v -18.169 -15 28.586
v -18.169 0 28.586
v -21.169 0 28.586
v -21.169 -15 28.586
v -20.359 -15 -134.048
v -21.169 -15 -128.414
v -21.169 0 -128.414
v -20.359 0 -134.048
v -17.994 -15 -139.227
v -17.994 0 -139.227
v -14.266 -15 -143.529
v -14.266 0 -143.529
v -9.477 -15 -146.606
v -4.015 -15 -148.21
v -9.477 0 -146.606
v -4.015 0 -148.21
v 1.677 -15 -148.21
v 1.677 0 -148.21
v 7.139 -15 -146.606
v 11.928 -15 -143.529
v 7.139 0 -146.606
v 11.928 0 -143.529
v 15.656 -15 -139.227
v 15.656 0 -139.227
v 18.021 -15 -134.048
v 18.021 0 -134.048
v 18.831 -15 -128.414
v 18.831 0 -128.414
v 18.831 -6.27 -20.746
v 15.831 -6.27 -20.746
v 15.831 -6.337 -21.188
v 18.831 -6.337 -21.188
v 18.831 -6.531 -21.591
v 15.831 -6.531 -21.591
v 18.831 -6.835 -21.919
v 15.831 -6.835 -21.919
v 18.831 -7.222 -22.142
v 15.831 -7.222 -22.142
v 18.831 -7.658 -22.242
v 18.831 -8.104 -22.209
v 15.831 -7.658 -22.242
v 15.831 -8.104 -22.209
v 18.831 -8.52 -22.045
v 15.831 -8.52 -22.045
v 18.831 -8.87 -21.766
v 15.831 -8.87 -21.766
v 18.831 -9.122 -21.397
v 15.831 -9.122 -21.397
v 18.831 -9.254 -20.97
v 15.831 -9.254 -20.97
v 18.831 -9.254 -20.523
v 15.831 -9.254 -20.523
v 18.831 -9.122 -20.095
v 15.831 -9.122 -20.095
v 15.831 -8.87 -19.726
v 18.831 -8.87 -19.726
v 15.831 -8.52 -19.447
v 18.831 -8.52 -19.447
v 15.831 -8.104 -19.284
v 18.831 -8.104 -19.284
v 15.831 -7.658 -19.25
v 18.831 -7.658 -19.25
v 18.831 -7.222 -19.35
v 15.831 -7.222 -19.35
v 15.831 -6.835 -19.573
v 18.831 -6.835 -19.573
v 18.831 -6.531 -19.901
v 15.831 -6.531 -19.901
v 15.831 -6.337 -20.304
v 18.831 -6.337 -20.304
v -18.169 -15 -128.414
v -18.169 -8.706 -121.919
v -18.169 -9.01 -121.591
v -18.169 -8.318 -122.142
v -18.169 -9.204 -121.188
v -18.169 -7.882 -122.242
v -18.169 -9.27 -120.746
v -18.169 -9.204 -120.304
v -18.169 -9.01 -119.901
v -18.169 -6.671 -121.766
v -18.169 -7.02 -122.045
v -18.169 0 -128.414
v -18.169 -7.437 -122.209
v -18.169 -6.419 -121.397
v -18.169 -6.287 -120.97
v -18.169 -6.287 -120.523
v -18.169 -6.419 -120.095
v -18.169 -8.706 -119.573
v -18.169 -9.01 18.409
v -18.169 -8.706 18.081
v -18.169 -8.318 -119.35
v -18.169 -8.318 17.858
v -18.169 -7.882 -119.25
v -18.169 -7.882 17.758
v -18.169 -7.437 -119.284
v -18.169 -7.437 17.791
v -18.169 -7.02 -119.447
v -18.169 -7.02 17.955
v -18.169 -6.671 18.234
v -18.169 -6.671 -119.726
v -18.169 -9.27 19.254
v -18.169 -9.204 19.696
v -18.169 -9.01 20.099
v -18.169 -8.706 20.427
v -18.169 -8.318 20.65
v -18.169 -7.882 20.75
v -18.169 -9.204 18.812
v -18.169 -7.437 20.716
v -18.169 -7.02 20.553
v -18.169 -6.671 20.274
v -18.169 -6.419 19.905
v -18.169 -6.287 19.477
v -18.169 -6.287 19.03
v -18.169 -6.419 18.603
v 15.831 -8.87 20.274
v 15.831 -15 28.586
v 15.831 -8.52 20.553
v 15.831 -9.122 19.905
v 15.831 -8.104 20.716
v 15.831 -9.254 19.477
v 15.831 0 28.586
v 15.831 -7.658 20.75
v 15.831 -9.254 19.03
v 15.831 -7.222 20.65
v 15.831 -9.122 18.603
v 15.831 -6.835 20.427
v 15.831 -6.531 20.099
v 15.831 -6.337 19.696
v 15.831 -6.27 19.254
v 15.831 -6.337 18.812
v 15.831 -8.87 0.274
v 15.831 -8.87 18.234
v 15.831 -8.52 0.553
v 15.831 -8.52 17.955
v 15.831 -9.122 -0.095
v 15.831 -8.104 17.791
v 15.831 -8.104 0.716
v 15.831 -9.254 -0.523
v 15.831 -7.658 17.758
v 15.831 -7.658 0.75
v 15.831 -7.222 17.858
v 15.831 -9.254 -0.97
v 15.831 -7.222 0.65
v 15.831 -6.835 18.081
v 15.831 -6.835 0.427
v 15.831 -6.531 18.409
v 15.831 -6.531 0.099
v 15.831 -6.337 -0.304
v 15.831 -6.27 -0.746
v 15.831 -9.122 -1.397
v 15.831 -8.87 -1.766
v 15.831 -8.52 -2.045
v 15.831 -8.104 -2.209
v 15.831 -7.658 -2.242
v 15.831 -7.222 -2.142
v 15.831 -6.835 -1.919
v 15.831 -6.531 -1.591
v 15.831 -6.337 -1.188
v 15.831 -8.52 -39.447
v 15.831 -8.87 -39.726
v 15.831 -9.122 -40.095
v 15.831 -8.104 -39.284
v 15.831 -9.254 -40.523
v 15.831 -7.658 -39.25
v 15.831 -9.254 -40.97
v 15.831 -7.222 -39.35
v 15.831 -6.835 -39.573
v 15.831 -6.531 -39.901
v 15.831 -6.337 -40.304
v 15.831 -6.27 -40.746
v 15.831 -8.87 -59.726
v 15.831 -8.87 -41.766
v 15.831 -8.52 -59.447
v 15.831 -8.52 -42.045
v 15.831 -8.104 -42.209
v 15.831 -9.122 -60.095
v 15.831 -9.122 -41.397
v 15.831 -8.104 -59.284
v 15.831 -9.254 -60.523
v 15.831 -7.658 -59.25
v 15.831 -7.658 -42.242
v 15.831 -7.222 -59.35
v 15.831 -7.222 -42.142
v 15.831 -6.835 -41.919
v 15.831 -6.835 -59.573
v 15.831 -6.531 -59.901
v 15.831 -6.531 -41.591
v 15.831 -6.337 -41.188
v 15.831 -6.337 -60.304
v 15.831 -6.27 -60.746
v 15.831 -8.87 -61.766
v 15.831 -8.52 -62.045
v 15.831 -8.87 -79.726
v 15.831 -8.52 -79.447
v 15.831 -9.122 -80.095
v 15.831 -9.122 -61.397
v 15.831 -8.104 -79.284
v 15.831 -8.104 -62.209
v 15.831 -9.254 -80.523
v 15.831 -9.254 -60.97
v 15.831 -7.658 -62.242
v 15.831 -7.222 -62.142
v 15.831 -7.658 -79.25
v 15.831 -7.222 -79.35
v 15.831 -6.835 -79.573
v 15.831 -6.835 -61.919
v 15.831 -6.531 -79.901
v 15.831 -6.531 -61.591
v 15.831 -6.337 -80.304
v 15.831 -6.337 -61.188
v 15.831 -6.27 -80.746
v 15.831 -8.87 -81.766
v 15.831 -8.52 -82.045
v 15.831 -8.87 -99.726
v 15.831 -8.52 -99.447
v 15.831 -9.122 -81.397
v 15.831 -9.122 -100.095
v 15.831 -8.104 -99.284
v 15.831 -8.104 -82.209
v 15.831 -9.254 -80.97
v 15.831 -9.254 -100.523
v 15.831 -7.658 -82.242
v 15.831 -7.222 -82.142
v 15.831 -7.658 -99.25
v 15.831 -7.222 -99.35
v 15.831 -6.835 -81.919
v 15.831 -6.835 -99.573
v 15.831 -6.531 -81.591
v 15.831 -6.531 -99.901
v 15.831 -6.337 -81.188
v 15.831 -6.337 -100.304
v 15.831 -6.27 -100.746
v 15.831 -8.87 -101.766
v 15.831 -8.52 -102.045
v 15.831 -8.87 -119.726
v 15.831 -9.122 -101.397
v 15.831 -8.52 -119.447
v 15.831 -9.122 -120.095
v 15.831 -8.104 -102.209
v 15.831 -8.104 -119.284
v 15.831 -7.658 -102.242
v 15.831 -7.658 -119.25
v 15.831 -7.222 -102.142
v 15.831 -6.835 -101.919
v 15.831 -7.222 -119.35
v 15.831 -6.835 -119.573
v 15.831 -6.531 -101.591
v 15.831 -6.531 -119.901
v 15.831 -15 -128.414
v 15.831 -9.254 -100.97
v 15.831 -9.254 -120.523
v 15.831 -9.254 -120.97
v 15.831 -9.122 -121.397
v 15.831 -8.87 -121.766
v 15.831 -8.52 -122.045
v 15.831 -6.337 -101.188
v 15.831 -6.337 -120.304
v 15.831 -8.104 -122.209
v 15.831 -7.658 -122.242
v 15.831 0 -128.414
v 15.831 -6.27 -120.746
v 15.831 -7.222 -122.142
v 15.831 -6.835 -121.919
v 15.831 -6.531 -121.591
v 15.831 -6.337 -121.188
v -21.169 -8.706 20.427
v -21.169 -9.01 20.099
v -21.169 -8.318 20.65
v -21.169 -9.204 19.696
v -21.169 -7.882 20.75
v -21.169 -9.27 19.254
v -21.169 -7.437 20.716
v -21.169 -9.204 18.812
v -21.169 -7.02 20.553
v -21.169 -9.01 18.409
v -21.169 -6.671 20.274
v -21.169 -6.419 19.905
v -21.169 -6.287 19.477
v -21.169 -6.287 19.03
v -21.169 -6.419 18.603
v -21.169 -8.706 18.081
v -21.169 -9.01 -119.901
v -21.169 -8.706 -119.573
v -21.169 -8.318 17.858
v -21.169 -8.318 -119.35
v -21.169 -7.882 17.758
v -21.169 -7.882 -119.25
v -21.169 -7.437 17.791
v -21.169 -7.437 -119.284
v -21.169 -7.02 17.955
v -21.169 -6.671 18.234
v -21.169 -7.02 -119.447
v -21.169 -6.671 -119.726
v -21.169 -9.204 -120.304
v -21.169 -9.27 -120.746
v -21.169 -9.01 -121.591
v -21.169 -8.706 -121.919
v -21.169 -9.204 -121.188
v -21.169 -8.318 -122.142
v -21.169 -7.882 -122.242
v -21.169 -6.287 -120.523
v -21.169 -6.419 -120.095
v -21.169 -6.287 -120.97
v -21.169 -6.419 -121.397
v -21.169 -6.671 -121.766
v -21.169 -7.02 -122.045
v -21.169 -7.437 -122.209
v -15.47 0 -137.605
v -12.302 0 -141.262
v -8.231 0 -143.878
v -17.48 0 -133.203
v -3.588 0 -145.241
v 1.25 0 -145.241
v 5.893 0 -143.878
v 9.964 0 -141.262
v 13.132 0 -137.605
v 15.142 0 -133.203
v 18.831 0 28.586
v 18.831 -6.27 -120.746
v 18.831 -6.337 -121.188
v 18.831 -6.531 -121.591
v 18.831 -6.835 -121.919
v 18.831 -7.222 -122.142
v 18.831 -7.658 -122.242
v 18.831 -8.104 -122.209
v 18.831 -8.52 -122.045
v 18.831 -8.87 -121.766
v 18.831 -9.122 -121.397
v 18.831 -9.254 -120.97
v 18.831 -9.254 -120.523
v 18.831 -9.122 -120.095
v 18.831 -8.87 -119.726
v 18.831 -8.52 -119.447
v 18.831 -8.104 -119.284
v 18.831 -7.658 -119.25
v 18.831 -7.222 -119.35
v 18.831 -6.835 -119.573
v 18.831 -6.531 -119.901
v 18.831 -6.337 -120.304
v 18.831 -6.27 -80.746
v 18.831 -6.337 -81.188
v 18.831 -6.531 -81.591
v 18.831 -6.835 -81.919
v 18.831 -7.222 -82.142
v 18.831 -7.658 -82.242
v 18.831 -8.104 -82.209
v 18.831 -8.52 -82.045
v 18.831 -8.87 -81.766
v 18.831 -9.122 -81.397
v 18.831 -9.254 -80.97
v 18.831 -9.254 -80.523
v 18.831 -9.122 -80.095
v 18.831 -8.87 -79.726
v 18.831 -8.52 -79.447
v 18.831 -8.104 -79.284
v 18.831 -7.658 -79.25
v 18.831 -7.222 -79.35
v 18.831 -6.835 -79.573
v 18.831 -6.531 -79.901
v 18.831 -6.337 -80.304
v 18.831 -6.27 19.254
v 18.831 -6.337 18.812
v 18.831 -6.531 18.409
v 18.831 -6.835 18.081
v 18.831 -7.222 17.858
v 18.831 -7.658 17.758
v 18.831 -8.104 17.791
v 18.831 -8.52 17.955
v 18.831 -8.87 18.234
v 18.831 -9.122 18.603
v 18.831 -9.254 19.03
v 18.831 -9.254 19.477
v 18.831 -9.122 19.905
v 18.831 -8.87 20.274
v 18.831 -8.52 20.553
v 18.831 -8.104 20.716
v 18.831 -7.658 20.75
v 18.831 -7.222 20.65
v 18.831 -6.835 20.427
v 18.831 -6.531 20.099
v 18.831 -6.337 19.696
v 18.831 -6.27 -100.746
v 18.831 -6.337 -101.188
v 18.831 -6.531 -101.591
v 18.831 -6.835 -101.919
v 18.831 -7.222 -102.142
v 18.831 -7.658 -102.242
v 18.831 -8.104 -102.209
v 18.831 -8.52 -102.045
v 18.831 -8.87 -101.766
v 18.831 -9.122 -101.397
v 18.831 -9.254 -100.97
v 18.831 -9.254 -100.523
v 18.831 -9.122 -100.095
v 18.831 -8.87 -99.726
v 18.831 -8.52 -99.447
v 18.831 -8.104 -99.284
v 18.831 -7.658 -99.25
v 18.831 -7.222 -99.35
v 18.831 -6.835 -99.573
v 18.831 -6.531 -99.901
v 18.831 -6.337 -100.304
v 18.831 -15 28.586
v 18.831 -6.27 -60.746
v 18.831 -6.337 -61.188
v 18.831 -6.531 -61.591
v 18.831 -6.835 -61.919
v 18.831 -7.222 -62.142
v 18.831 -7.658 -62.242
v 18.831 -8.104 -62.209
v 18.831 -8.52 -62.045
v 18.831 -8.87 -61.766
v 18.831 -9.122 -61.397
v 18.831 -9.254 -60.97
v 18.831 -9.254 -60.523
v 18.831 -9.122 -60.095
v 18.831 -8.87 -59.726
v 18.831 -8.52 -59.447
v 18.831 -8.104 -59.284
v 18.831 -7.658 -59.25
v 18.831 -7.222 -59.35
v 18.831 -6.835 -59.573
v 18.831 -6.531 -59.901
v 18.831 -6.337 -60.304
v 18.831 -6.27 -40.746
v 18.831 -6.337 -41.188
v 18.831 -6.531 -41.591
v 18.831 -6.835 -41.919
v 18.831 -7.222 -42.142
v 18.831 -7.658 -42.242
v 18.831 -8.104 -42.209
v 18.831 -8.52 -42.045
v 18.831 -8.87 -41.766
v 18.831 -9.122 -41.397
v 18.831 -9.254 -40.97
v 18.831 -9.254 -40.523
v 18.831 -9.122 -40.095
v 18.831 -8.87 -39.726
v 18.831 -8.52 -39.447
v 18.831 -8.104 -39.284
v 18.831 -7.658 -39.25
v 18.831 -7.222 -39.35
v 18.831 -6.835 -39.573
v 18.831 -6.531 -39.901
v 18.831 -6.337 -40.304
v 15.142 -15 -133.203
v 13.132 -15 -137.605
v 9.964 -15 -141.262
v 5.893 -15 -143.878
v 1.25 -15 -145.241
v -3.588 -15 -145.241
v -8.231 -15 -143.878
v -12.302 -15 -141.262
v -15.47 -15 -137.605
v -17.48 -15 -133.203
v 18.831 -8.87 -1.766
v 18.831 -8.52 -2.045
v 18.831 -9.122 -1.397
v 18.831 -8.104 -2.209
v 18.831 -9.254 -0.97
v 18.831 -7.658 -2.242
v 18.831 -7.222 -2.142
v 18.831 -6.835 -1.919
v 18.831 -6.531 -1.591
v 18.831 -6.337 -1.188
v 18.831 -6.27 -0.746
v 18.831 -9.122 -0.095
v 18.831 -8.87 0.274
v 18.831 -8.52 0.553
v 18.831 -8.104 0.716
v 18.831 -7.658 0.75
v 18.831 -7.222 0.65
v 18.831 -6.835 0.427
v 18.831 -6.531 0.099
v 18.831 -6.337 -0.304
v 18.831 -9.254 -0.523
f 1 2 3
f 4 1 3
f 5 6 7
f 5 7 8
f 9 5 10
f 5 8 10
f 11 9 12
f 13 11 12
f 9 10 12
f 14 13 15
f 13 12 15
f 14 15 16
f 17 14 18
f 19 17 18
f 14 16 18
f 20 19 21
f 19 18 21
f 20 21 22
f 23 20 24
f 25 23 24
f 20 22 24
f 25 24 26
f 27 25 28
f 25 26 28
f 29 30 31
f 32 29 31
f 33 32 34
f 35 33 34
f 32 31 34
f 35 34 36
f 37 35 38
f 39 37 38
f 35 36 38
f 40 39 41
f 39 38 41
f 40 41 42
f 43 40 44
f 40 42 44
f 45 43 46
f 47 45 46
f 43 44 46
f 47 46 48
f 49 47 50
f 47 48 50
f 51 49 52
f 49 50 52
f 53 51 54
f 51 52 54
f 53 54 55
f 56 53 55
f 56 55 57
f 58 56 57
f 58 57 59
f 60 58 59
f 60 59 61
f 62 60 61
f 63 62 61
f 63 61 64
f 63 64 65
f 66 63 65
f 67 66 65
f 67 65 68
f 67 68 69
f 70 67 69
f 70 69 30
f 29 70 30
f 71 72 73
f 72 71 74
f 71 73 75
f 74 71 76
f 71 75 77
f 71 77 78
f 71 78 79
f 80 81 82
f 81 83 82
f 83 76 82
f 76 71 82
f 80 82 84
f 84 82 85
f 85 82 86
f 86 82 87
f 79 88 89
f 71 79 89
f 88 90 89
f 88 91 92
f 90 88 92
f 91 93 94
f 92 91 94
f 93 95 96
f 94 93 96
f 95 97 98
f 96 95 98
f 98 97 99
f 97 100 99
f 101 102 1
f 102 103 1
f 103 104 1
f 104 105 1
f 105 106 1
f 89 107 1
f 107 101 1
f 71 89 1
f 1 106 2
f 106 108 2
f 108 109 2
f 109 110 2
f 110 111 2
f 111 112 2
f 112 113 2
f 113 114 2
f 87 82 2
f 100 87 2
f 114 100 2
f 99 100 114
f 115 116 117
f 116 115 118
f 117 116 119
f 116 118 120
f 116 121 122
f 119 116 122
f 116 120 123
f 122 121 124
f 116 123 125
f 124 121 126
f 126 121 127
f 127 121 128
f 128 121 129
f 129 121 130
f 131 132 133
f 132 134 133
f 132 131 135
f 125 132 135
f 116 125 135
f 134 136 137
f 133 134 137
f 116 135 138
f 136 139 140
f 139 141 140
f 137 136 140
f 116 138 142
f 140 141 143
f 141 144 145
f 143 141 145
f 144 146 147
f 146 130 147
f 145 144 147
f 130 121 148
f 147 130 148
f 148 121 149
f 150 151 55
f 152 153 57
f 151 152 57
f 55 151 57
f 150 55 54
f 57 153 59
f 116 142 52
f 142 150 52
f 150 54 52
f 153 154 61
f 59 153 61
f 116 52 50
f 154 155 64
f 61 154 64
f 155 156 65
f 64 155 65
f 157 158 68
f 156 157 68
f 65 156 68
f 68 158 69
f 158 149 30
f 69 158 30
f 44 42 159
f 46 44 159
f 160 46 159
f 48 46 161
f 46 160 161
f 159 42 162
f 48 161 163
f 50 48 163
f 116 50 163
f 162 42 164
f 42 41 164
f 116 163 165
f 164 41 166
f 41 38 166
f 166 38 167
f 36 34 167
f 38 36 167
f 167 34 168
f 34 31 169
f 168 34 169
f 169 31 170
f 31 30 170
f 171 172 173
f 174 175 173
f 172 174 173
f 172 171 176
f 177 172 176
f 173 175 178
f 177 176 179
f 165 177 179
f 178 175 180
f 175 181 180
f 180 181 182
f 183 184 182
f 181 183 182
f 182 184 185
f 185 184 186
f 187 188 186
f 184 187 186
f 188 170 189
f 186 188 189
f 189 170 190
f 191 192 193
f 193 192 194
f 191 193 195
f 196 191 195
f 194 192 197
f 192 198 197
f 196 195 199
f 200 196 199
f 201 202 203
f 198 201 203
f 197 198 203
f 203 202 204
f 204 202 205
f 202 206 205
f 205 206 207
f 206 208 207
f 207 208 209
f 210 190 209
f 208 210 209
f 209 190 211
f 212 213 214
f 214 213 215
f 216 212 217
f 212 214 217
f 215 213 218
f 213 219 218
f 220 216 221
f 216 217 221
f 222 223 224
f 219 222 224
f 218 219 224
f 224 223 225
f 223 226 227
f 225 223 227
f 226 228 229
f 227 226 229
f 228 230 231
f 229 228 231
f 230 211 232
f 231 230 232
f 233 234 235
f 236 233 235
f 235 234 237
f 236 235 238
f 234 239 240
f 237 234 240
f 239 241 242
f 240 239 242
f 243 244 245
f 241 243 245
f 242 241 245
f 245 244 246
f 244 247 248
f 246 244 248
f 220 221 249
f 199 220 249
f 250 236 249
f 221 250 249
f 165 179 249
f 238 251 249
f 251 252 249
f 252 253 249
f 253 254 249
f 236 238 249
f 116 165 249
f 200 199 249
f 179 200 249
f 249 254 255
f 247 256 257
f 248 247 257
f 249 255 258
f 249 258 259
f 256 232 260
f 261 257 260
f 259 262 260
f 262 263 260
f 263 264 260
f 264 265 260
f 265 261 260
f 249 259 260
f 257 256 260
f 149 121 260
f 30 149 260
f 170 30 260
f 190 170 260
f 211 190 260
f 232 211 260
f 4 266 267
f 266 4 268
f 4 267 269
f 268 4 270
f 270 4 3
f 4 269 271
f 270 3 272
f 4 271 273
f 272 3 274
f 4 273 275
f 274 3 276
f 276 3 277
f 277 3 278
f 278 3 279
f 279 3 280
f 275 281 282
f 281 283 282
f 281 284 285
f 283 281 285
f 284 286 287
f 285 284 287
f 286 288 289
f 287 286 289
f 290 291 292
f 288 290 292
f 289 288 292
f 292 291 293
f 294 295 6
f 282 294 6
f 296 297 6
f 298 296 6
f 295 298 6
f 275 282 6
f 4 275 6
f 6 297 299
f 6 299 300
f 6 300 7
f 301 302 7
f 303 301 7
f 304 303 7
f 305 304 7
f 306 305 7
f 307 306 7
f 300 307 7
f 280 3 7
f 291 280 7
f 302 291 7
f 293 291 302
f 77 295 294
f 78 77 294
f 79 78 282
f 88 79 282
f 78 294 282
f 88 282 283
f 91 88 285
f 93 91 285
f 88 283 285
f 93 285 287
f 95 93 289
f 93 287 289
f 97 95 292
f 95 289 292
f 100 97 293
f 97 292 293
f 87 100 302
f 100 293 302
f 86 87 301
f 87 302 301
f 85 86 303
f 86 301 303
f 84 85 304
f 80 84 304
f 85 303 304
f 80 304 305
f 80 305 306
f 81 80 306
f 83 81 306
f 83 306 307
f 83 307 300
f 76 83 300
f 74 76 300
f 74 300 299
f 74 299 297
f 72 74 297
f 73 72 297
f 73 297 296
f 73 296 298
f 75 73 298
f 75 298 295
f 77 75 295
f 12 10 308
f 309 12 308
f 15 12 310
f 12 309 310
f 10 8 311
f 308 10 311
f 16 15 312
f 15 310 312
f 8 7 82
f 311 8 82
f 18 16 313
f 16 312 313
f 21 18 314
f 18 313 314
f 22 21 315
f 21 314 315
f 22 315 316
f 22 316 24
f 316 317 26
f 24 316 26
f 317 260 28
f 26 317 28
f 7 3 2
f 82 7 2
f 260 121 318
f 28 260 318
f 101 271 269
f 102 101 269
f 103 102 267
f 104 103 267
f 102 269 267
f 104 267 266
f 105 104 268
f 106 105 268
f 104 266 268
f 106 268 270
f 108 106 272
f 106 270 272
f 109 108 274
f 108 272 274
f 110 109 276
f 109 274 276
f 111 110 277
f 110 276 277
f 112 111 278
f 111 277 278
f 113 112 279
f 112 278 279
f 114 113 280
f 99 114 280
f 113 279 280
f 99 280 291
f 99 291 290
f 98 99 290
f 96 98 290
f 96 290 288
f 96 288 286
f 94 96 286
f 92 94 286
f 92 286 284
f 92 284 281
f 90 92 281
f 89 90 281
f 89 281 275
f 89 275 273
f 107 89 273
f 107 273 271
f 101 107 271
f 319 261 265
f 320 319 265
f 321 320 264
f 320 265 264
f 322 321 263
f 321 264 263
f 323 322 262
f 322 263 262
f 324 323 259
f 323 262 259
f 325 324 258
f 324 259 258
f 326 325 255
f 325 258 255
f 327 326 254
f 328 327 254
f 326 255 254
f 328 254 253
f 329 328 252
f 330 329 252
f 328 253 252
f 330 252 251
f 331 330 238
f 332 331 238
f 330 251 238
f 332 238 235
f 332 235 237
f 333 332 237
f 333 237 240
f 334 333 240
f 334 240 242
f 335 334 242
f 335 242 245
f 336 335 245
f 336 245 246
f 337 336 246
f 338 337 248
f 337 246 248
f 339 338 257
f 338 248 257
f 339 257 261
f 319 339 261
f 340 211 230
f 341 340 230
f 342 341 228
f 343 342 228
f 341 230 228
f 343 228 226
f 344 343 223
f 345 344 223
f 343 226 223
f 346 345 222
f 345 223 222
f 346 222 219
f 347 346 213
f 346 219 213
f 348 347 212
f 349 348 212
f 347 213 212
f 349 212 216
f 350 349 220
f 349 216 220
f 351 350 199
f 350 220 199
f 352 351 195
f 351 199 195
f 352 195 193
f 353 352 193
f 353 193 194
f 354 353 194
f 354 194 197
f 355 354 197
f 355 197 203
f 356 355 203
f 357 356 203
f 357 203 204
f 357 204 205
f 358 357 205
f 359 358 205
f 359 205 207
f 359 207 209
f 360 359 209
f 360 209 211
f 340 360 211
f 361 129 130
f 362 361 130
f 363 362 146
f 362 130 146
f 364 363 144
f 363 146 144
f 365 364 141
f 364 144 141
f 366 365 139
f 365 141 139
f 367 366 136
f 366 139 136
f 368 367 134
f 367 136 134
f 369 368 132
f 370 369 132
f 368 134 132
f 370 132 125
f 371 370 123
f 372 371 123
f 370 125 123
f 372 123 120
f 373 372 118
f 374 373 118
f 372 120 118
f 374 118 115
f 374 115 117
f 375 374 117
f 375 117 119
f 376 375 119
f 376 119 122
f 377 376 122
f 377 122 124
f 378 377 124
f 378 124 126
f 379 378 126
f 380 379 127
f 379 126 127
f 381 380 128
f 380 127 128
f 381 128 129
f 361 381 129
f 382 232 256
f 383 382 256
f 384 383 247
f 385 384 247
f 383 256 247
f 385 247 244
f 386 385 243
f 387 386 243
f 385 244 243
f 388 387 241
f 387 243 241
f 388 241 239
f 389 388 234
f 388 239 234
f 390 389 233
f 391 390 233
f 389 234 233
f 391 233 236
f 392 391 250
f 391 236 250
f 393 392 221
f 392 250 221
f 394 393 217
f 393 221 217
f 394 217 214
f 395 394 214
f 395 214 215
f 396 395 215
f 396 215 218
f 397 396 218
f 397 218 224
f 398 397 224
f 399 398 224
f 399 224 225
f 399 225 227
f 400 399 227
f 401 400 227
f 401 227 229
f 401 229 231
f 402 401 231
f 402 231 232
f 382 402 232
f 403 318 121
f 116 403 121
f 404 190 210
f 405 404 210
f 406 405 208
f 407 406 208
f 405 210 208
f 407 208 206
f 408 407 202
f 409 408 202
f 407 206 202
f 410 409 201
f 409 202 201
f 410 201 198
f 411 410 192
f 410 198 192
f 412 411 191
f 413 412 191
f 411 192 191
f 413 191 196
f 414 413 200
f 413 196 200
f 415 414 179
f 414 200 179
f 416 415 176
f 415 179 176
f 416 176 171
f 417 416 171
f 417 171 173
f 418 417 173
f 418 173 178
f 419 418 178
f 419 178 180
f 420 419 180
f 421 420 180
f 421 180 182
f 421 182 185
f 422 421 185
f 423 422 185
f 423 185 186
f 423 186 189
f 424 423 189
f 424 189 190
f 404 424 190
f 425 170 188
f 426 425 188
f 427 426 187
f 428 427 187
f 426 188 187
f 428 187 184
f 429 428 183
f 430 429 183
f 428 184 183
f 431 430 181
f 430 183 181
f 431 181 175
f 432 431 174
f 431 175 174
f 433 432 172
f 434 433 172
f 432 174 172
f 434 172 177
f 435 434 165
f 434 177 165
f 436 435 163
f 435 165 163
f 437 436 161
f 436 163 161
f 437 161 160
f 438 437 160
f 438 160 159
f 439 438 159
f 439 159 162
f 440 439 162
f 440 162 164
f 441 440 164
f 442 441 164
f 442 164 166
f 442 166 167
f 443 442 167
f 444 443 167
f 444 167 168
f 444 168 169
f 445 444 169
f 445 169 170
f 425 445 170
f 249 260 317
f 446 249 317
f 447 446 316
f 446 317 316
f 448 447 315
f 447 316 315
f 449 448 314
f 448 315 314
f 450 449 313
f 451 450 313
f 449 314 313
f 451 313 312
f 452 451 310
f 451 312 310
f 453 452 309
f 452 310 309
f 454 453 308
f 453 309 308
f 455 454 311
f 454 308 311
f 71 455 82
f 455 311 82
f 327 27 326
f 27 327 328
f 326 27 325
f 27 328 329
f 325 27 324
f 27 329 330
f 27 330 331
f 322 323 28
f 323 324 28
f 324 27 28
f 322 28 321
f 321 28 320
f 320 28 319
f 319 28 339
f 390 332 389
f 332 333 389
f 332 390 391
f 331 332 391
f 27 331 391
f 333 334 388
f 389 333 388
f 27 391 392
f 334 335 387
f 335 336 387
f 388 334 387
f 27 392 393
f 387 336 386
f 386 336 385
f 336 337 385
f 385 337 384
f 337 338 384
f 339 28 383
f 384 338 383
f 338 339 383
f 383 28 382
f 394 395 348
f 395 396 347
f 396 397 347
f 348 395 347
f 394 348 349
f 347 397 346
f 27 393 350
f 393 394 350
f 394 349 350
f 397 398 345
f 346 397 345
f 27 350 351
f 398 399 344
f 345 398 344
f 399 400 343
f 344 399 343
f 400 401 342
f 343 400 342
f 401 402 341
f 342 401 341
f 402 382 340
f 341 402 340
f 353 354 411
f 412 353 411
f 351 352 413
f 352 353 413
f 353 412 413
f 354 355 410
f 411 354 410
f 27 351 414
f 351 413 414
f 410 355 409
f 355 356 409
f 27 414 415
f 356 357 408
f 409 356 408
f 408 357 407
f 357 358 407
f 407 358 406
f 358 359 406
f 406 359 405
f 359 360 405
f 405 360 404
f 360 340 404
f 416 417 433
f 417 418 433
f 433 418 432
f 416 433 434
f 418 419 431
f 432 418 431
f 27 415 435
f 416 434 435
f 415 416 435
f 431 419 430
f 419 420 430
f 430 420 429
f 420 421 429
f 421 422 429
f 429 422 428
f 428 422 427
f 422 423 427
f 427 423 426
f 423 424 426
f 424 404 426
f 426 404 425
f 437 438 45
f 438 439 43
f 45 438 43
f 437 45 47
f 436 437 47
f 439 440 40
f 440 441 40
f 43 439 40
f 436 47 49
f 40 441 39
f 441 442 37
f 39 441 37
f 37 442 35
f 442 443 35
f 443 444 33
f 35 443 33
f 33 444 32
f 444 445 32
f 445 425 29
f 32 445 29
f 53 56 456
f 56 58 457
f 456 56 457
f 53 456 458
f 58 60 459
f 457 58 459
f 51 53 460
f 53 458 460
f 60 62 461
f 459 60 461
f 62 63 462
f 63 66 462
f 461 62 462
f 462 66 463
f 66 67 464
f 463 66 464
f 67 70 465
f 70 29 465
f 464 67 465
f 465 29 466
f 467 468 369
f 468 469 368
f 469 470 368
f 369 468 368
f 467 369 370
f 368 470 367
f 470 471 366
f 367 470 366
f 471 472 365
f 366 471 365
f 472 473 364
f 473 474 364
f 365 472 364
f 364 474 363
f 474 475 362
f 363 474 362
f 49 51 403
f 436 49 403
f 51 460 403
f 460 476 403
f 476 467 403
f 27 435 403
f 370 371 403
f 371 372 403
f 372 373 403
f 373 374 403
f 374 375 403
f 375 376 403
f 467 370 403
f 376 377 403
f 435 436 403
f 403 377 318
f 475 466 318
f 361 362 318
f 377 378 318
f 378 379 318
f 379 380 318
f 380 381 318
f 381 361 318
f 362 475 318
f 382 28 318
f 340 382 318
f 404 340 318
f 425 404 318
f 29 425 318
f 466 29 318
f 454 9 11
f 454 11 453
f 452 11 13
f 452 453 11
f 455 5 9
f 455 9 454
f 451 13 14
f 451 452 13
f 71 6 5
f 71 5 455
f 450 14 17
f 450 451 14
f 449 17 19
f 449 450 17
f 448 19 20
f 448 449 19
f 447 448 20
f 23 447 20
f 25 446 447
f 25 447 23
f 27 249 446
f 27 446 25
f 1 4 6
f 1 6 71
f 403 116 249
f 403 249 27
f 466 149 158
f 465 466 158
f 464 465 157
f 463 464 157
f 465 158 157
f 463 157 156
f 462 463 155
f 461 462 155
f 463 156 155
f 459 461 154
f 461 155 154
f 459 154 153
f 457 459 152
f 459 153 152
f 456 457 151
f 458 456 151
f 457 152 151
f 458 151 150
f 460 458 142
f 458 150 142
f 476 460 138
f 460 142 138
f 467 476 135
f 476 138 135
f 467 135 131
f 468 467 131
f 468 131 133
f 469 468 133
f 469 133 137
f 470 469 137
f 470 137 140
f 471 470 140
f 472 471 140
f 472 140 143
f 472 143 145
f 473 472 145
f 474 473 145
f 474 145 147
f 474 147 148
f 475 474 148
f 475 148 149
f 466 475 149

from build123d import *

# Parameters (mm, degrees)
F1_DEPTH = 15
F3_D     = 3
F3_DEPTH = 18.8319625536
F4_D     = 3


# Not quite as in the source:
# - a feature names something its author has since deleted; it is built from what else it names


with BuildPart() as f1:
    # F0 (on Front) → F1 (new body)
    with BuildSketch(Plane.XZ):
        with BuildLine():
            Line((-18.1690374464, 28.586239934), (-21.1690374464, 28.586239934))
            Line((-21.1690374464, 28.586239934), (-21.1690374464, -128.413760066))
            ThreePointArc((-21.1690374464, -128.413760066), (-1.1690374464, -148.413760066), (18.8309625536, -128.413760066))
            Line((18.8309625536, -128.413760066), (18.8309625536, 28.586239934))
            Line((18.8309625536, 28.586239934), (15.8309625536, 28.586239934))
            Line((15.8309625536, 28.586239934), (15.8309625536, -128.413760066))
            ThreePointArc((15.8309625536, -128.413760066), (-1.1690374464, -145.413760066), (-18.1690374464, -128.413760066))
            Line((-18.1690374464, -128.413760066), (-18.1690374464, 28.586239934))
        make_face()
    extrude(amount=F1_DEPTH)

    # F3 (through all, one way)
    with BuildSketch(Plane(origin=(0, 0, 0), x_dir=(0, 1, 0), z_dir=(-1, 0, 0))):
        with Locations((-7.7703874558, 0.7461506128), (-7.7703874558, 20.7461506128), (-7.7703874558, 40.7461506128), (-7.7703874558, 60.7461506128), (-7.7703874558, 80.7461506128), (-7.7703874558, 100.7461506128), (-7.7703874558, 120.7461506128), (-7.7703874558, -19.2538493872)):
            Circle(F3_D / 2)
    extrude(amount=-F3_DEPTH, mode=Mode.SUBTRACT)

    # F4 (through all)
    with Locations(Plane.YZ):
        with Locations((-7.7703874558, 19.2538493872), (-7.7703874558, -120.7461506128)):
            Hole(F4_D / 2)


solid = f1.part
